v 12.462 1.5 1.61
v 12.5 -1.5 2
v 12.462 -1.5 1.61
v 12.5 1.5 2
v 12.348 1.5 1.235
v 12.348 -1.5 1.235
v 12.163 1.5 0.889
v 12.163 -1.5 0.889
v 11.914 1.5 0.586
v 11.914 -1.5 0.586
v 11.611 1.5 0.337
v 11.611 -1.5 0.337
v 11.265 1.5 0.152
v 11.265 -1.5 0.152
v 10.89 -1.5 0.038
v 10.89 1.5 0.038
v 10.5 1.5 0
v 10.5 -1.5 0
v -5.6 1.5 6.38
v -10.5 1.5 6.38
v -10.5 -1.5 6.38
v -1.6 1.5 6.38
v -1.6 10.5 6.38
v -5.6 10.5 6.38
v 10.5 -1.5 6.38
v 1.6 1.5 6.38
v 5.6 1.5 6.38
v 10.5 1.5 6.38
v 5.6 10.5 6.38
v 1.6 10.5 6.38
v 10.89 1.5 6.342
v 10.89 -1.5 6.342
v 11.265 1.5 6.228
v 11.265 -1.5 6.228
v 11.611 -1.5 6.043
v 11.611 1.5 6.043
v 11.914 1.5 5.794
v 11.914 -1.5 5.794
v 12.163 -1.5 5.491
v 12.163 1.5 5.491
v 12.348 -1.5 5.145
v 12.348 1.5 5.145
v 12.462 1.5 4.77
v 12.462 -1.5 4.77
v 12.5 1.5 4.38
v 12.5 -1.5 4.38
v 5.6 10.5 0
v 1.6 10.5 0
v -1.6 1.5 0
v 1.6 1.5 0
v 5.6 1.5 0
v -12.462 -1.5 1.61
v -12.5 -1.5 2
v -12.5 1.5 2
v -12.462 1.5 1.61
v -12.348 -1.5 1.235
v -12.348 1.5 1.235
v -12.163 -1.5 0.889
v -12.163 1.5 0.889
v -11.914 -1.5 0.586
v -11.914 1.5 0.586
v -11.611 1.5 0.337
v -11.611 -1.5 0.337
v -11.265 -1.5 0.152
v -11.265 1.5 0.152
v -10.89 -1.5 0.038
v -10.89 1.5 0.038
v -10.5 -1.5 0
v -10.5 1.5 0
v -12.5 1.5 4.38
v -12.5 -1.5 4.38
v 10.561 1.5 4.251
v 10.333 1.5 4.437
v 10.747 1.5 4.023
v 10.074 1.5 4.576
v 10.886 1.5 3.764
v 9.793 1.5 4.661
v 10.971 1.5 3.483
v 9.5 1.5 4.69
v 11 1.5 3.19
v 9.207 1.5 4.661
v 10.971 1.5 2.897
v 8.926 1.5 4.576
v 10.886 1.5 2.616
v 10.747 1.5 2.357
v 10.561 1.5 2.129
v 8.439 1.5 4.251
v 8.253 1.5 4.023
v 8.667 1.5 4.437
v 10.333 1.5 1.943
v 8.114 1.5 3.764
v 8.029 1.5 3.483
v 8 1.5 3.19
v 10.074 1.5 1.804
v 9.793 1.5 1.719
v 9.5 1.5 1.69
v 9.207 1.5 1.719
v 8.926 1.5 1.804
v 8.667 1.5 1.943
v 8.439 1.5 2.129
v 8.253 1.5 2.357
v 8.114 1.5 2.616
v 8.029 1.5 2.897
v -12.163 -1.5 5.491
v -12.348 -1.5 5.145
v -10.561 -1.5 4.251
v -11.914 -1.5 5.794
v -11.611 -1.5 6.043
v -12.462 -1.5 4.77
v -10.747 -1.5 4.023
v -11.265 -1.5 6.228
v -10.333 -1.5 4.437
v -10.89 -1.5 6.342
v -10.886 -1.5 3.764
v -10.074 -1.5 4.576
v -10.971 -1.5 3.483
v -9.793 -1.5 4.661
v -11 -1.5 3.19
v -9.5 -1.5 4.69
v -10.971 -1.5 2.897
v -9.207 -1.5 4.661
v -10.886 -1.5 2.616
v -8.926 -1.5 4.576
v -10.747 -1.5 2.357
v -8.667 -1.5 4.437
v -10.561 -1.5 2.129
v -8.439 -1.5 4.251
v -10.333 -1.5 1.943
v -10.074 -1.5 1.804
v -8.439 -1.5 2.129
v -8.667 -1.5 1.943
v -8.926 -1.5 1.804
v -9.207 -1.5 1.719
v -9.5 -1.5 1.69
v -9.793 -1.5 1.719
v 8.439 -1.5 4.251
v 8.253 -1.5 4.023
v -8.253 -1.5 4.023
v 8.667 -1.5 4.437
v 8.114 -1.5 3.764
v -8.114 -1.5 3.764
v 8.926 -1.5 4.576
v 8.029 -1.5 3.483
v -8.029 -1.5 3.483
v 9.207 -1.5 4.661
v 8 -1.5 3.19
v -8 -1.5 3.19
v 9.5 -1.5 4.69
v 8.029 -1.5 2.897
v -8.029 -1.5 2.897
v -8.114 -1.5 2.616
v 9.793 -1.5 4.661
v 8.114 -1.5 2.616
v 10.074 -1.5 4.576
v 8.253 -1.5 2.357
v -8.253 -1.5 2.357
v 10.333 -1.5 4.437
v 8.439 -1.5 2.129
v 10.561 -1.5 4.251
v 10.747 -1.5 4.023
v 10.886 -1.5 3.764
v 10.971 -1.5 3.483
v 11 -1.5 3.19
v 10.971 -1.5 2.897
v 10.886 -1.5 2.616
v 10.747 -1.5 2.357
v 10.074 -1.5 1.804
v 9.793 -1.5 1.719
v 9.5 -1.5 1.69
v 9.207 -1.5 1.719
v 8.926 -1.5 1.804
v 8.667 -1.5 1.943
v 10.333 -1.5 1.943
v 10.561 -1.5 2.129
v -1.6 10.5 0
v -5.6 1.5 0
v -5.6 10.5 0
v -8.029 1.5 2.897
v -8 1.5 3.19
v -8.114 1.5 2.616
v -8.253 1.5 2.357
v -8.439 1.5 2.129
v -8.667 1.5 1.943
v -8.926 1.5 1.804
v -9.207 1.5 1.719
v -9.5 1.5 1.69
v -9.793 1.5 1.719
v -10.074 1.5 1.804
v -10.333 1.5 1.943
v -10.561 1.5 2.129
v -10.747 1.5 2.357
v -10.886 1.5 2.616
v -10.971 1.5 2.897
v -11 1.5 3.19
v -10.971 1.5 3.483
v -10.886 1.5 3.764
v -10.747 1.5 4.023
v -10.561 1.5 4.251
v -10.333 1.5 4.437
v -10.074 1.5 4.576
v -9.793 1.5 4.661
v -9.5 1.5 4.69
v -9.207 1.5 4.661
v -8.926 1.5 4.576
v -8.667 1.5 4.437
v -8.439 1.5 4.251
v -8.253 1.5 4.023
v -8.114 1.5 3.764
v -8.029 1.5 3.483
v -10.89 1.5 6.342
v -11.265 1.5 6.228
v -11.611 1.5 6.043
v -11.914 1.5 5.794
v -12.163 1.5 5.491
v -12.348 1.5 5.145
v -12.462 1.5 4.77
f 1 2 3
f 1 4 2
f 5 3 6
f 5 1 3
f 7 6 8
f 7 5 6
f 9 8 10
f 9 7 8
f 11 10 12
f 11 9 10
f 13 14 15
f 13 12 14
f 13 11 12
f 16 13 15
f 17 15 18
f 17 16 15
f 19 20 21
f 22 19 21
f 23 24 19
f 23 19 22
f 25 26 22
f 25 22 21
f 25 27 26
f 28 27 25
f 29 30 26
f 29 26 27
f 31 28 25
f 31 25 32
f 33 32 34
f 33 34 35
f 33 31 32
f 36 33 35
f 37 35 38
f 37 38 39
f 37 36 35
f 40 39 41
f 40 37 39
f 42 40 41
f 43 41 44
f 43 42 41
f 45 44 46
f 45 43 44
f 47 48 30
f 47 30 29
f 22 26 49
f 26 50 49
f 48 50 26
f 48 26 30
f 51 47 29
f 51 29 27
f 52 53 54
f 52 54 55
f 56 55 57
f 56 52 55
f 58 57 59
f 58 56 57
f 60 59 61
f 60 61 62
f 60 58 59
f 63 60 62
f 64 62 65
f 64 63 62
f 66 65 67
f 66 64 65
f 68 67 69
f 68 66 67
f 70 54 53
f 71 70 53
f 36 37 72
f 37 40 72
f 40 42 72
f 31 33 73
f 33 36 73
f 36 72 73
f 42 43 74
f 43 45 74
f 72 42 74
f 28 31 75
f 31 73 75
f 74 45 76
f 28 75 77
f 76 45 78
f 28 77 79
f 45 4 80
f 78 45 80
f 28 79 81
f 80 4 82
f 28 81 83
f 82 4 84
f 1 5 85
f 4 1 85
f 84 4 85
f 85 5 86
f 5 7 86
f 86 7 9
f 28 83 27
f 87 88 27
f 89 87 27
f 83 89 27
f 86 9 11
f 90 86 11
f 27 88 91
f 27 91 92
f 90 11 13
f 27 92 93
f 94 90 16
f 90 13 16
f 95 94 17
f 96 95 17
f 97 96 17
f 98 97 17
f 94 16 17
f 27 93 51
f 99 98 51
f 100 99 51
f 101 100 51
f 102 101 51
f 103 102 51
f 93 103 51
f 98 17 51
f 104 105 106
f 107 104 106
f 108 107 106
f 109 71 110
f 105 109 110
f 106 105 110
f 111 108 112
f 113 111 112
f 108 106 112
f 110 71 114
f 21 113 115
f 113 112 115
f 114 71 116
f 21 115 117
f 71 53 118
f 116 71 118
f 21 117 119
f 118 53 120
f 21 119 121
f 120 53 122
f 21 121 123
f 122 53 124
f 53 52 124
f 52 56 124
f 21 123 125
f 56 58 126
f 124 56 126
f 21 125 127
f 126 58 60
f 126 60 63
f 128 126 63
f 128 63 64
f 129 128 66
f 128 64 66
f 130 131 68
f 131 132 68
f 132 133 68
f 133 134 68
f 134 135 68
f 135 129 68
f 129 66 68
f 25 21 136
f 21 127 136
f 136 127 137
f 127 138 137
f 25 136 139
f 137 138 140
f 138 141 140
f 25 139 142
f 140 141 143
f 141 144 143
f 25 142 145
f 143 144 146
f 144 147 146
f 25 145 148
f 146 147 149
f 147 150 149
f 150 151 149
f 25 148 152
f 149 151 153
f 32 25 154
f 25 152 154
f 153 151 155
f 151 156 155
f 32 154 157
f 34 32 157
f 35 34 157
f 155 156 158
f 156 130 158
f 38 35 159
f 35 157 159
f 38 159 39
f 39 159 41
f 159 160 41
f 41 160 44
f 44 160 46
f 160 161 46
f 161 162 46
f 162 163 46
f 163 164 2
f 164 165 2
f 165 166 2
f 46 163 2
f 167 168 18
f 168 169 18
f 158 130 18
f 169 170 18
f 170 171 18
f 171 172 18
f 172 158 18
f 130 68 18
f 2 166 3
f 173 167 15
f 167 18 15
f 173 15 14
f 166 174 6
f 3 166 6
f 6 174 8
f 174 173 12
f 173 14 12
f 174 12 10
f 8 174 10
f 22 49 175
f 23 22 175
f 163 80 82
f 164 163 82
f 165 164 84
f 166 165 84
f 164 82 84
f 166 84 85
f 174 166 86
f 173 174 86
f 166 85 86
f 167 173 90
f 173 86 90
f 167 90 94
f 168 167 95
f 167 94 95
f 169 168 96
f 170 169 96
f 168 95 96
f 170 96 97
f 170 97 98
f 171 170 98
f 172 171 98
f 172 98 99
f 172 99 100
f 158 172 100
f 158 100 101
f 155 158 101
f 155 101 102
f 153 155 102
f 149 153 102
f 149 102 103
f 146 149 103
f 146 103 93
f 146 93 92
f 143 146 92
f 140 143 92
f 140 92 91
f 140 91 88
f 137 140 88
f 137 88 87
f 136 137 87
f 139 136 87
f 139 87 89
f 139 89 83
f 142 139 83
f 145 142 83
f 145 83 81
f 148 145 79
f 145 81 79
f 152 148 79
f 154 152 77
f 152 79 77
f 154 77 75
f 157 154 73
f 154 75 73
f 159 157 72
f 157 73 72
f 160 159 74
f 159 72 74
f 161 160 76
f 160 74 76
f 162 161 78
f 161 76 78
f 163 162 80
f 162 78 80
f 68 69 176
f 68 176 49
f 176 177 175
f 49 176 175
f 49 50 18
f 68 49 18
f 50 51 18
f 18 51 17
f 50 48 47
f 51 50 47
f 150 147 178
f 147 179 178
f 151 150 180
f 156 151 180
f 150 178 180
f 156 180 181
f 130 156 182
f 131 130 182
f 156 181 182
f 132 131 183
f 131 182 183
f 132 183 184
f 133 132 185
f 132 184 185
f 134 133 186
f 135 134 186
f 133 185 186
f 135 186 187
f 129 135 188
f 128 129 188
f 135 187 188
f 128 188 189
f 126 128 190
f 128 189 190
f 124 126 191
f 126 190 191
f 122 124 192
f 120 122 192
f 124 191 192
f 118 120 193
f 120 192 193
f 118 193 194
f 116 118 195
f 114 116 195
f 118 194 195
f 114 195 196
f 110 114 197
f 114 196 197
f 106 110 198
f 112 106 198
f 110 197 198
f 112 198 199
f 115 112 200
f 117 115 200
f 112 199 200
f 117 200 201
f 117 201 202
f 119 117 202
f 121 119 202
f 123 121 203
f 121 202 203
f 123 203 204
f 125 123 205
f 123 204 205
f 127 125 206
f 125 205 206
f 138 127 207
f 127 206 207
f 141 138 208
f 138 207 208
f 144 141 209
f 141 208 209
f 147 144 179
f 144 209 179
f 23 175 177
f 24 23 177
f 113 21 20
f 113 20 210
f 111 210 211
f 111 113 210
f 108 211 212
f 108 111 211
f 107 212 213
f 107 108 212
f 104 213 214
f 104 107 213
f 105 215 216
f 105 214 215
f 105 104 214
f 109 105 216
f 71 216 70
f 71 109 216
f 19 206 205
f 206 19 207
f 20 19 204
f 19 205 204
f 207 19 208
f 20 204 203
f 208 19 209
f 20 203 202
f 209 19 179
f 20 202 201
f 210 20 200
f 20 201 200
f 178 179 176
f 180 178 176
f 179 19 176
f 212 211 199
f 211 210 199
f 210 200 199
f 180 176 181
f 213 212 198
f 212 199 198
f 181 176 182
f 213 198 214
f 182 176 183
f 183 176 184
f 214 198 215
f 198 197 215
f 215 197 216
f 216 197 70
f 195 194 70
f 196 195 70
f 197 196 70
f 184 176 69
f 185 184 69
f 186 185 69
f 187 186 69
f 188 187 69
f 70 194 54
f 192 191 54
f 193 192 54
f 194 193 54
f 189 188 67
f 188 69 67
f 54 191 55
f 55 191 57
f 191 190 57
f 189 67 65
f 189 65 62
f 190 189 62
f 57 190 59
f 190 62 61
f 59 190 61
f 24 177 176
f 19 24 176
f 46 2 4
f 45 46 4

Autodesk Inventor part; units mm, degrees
ref_plane "YZ Plane" through (0, 0, 0) normal (1, 0, 0) x (0, 1, 0)
ref_plane "XZ Plane" through (0, 0, 0) normal (0, 1, 0) x (-1, 0, 0)
ref_plane "XY Plane" through (0, 0, 0) normal (0, 0, 1) x (1, 0, 0)
sketch "Sketch1" plane through (0, 0, 0) normal (0, 0, 1) x (1, 0, 0)
  line L0 (-12.5, -1.5) -> (12.5, -1.5)
  line L1 (12.5, -1.5) -> (12.5, 1.5)
  line L2 (12.5, 1.5) -> (-12.5, 1.5)
  line L3 (-12.5, 1.5) -> (-12.5, -1.5)
  line L4 (-12.5, -1.5) -> (12.5, 1.5) construction
  line L5 (12.5, -1.5) -> (-12.5, 1.5) construction
  line L6 (-5.6, 1.5) -> (-1.6, 1.5)
  line L7 (-1.6, 1.5) -> (-1.6, 10.5)
  line L8 (-1.6, 10.5) -> (-5.6, 10.5)
  line L9 (-5.6, 10.5) -> (-5.6, 1.5)
  line L10 (0, 1.5) -> (0, 12.2186)
  line L11 (1.6, 1.5) -> (1.6, 10.5)
  line L12 (1.6, 10.5) -> (5.6, 10.5)
  line L13 (5.6, 10.5) -> (5.6, 1.5)
  point P0 (0, 0)
  point P1 (5.6, 1.5)
  point P2 (1.6, 1.5)
  point P3 (-1.6, 1.5)
  dimension "d0" = 25
  dimension "d1" = 3
  dimension "d2" = 4
  dimension "d3" = 9
  dimension "d4" = 3.2
extrude "Extrusion1" add sketch "Sketch1" along normal blind 6.38
sketch "Sketch2" plane through (5.6, 1.5, 0) normal (0, 1, 0) x (1, 0, 0)
  circle A0 centre (3.9, -3.19) radius 1.5
  line L0 (6.9, 0) -> (6.9, -6.38) projected
  circle A1 centre (-15.1, -3.19) radius 1.5
  line L1 (-18.1, 0) -> (-18.1, -6.38) projected
  point P0 (-5.6, 0)
  dimension "d7" = 3
  dimension "d8" = 3
  dimension "d9" = 3
  dimension "d10" = 3
  dimension "d14" = 19
extrude "Extrusion2" cut sketch "Sketch2" against normal through all
fillet "Fillet1" radius 2 4 edges at (12.5, 0, 6.38) (12.5, 0, 0) (-12.5, 0, 6.38) (-12.5, 0, 0)
properties part number "Sensor"
